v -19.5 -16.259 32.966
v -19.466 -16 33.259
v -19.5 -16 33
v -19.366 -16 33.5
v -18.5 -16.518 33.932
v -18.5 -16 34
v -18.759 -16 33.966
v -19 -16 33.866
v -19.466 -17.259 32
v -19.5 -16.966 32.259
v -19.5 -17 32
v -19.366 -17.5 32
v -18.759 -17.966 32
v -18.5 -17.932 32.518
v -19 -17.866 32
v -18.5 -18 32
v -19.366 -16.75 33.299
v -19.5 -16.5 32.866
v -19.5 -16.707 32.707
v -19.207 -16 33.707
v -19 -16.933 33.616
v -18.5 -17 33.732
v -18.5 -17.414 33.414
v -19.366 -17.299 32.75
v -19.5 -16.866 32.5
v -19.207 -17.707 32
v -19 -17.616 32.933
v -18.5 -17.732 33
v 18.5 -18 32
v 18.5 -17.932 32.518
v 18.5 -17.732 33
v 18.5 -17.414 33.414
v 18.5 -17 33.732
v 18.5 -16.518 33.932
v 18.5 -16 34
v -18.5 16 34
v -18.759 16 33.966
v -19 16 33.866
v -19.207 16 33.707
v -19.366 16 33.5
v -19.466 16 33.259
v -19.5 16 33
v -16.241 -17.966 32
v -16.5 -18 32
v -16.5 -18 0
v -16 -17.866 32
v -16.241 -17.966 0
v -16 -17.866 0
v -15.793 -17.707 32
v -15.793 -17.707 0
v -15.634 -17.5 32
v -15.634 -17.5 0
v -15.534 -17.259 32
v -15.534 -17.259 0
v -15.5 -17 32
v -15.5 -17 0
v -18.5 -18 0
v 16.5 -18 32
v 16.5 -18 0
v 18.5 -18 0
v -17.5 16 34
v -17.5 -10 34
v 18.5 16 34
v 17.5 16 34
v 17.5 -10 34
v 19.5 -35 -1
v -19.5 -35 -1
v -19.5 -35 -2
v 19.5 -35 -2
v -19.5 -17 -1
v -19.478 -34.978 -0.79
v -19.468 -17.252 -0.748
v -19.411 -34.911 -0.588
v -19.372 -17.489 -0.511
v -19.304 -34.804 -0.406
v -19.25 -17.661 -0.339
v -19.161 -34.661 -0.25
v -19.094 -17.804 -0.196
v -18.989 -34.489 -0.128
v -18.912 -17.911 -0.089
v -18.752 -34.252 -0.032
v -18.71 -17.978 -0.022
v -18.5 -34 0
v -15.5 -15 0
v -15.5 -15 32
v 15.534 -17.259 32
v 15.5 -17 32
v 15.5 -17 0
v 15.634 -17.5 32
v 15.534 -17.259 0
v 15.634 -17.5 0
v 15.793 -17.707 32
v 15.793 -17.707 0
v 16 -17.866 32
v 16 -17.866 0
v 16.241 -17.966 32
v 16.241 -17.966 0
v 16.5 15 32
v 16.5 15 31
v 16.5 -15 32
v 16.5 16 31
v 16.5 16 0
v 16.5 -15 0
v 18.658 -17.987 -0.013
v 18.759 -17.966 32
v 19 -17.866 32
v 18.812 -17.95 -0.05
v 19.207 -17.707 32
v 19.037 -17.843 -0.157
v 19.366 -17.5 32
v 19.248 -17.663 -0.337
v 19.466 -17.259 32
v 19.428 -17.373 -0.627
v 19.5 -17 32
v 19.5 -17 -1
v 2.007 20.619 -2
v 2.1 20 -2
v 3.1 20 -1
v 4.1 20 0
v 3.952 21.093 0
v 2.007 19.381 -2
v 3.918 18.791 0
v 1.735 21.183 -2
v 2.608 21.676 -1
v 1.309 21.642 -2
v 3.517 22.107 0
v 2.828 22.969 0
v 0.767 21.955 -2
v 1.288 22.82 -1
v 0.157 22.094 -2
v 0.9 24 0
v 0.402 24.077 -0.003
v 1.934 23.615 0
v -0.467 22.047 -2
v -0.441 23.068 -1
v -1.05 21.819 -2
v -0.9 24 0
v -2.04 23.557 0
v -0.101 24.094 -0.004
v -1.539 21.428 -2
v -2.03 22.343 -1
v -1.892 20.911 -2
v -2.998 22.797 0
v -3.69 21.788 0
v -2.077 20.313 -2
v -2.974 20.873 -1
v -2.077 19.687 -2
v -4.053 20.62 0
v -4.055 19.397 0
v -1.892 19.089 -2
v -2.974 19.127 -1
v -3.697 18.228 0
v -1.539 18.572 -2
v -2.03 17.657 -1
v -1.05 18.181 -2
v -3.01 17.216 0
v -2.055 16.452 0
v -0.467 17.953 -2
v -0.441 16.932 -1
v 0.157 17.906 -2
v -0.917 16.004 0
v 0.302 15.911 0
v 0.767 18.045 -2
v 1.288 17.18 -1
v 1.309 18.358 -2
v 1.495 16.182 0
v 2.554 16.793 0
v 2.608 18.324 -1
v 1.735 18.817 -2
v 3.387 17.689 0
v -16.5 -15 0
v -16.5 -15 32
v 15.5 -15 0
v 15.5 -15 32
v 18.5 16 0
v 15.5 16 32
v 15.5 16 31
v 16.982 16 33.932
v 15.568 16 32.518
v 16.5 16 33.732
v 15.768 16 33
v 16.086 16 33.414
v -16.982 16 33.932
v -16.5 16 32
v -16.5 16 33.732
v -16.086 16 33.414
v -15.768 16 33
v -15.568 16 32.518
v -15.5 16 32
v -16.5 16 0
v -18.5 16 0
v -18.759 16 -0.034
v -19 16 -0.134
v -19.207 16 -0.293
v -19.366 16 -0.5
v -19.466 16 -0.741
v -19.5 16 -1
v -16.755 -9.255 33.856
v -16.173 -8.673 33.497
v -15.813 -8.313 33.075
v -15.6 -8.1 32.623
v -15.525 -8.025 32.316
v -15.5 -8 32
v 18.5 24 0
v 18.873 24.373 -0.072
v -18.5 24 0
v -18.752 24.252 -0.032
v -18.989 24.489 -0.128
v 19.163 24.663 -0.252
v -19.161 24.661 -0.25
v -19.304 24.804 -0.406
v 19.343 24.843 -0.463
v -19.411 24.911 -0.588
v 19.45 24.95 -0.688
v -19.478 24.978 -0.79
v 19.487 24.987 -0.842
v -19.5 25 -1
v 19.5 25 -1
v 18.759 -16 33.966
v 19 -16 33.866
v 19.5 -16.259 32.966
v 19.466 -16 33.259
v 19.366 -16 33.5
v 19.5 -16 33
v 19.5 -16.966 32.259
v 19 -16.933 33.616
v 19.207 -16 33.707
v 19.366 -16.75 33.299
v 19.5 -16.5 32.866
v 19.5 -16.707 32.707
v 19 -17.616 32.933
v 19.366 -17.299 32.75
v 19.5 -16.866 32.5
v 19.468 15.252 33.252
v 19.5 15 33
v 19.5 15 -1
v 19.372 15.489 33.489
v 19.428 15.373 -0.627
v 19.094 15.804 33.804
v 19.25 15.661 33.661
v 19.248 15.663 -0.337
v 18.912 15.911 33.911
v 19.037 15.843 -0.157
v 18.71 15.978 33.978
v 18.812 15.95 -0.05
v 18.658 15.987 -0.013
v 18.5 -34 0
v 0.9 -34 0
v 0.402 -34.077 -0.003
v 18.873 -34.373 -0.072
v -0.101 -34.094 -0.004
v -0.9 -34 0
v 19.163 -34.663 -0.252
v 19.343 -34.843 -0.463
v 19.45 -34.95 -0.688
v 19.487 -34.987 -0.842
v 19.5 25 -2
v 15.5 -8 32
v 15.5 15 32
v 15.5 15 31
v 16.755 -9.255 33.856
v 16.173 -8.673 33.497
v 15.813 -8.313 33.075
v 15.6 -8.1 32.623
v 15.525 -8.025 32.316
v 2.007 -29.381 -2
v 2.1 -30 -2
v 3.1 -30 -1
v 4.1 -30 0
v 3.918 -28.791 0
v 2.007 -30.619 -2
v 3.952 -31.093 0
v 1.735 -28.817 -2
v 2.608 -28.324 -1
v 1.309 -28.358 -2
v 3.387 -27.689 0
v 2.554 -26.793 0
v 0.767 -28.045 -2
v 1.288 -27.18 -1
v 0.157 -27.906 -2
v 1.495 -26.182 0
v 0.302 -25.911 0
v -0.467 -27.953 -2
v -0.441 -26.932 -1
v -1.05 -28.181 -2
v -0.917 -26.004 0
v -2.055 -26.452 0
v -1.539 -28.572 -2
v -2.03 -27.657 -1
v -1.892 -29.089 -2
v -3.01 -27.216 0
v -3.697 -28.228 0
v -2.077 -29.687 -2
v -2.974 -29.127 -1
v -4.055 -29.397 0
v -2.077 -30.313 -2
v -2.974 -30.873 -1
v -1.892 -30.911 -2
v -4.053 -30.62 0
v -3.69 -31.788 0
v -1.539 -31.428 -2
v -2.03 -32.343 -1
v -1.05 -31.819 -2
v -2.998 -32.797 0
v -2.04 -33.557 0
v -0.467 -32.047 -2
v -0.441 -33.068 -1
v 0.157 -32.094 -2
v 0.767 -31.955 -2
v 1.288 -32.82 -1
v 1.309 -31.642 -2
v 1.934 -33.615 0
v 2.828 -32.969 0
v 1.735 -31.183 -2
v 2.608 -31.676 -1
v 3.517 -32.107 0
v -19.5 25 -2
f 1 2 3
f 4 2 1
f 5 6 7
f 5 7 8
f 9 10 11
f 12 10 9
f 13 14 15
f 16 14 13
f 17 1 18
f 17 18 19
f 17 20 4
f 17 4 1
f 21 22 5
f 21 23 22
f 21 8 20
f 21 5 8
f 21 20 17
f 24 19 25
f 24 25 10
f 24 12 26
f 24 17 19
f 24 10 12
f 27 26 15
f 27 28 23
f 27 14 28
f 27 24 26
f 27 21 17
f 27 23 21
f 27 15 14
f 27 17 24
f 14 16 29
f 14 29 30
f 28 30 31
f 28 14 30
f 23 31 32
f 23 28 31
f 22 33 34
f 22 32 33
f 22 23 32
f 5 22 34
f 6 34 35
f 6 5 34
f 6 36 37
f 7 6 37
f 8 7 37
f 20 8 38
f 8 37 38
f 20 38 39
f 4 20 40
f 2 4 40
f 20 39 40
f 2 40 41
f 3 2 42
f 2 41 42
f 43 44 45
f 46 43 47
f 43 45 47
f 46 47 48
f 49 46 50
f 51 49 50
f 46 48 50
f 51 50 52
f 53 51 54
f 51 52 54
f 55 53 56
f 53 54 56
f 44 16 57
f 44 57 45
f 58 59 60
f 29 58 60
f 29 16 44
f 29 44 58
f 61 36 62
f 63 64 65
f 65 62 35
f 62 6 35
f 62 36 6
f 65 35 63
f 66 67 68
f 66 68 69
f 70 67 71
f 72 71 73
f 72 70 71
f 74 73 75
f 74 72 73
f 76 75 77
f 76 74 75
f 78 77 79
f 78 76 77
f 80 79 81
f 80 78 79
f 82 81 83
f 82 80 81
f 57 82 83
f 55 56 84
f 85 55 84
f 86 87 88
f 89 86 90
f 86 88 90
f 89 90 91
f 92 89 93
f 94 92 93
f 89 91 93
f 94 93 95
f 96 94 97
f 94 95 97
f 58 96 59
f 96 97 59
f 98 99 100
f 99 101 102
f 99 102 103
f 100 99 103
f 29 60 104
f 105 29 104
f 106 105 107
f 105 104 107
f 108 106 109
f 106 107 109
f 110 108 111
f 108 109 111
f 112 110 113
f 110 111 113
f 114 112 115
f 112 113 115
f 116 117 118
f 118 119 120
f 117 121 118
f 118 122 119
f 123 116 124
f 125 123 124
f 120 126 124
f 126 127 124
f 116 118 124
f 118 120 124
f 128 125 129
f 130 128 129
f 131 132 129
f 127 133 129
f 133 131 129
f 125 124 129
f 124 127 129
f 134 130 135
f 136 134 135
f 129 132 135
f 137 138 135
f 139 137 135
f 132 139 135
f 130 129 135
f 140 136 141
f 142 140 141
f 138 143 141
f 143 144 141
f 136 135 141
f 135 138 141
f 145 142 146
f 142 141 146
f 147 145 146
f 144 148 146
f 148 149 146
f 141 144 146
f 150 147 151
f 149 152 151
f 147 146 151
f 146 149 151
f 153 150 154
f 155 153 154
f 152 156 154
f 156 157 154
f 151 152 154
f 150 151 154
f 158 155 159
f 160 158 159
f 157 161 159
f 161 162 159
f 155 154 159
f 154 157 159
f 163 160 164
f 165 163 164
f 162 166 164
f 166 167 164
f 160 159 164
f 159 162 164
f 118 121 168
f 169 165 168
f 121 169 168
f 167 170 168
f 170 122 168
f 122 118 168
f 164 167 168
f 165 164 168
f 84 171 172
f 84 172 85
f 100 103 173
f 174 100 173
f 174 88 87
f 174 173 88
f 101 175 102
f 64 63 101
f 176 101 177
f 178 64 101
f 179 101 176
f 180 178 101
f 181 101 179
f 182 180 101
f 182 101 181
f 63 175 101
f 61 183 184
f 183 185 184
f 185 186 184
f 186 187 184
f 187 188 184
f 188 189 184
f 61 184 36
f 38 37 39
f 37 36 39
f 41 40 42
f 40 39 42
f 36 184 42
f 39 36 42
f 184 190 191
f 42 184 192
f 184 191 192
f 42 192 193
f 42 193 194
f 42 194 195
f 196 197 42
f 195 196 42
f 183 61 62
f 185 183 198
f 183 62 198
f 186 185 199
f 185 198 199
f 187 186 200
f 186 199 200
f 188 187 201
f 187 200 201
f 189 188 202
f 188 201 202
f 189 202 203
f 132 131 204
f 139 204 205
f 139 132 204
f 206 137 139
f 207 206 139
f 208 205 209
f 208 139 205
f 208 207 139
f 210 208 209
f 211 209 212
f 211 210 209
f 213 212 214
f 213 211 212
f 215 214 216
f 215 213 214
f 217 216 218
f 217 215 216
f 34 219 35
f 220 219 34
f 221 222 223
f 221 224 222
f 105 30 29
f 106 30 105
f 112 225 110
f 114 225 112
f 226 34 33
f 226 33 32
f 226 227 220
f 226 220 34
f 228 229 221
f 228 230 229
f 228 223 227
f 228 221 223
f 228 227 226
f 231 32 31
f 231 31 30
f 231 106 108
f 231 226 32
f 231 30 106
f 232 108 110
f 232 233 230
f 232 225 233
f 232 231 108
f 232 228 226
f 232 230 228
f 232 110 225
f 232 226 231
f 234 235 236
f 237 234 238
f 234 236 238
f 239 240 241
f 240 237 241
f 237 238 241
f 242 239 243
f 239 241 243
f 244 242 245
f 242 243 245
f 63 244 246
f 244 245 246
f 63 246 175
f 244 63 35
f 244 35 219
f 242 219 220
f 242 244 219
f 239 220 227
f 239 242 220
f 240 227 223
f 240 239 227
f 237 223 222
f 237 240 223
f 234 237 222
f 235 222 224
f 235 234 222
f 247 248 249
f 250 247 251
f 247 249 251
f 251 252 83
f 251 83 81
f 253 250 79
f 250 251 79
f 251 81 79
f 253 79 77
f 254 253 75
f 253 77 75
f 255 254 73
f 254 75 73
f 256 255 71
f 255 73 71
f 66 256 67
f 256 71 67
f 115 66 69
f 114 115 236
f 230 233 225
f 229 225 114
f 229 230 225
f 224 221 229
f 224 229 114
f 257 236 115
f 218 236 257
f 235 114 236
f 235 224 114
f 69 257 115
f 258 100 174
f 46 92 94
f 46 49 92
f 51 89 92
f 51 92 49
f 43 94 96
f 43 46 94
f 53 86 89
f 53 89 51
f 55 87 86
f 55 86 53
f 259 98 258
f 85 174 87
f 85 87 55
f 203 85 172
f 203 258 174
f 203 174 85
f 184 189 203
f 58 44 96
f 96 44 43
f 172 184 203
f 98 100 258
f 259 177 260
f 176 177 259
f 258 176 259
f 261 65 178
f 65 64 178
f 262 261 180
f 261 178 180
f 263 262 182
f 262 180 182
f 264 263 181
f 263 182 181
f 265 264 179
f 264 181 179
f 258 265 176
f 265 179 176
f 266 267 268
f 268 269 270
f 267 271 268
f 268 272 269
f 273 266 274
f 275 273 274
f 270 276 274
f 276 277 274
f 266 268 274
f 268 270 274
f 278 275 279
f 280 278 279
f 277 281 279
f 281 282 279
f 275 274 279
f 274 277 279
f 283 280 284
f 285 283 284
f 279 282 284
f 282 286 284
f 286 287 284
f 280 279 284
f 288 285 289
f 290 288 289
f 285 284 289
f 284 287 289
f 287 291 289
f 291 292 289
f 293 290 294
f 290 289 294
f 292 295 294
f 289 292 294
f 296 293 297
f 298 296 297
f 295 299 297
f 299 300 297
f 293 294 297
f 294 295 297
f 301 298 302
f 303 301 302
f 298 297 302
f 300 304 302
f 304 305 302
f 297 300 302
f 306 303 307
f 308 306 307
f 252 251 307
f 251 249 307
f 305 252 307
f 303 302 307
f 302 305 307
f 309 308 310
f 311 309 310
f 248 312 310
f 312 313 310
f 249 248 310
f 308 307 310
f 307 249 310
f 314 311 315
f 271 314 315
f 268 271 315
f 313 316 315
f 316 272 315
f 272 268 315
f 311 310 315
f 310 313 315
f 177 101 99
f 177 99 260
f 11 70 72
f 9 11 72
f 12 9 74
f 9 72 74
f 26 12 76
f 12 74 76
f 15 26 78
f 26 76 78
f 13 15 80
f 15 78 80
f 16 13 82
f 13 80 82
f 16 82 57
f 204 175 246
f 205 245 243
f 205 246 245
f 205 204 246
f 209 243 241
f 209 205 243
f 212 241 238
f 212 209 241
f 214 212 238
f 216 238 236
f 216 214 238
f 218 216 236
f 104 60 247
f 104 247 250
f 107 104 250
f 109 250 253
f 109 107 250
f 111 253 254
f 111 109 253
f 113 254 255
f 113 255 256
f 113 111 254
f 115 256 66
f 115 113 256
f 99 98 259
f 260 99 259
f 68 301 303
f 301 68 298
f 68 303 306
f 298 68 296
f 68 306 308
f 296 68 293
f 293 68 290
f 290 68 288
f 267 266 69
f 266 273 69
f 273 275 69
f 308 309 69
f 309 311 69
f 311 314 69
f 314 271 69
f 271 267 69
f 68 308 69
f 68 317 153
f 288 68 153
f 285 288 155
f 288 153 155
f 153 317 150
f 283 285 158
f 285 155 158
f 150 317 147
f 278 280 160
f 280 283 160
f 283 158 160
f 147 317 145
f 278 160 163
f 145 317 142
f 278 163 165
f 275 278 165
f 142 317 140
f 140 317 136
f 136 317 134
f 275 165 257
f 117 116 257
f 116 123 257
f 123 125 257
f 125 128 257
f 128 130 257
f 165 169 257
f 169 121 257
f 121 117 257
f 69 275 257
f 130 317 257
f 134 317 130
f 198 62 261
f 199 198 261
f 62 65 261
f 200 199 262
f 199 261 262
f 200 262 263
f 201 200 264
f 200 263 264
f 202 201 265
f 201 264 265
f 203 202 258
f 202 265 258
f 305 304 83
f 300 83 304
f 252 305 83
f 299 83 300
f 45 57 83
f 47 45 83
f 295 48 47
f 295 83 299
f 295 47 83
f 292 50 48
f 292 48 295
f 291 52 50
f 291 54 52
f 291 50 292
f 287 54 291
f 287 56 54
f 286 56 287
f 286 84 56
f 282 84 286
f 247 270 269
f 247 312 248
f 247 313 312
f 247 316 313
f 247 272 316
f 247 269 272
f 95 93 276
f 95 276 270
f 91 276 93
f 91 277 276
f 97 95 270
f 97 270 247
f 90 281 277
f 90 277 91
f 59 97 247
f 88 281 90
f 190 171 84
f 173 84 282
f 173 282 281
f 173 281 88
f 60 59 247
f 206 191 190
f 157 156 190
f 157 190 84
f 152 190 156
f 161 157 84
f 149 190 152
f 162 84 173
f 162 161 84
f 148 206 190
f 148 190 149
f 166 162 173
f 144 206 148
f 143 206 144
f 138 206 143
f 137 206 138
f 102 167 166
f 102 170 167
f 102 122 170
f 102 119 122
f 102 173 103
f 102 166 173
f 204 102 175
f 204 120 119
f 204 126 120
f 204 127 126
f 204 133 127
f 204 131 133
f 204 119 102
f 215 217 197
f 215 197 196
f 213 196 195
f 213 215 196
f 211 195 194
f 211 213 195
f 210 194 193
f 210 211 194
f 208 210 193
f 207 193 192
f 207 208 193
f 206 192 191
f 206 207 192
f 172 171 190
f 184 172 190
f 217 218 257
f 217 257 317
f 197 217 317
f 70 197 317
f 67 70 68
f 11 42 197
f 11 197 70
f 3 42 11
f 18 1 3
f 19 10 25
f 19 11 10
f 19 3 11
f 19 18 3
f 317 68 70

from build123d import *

# Parameters (mm, degrees)
F0_W          = 3
F0_H          = 9
F0_H_2        = 7
F0_H_3        = 3
F0_R          = 2.1
F0_W_2        = 1
F1_DEPTH      = 2
F2_DEPTH      = 34
F3_W          = 4
F3_H          = 2
F4_DEPTH      = 34
F5_SIZE       = 1.99999
F7_W          = 1
F7_H          = 1
F8_DEPTH      = 1
F3_W_2        = 31
F9_DEPTH      = 10
F10_R         = 1.99999
F11_T1_DEPTH  = 32
F11_T3_DEPTH  = 34.50001
F11_T5_DEPTH  = 32.00001
F11_T7_DEPTH  = 19.5
F11_T9_DEPTH  = 11.5
F11_T11_DEPTH = 44
F11_T13_DEPTH = 36.5
F11_T16_ANGLE = 90
F11_T18_ANGLE = 90
F11_T23_DEPTH = 34.50001
F11_T27_DEPTH = 22
F11_T34_DEPTH = 14
F11_T38_DEPTH = 39
F11_T45_DEPTH = 22
F11_T49_DEPTH = 34.50001


# Not quite as in the source:
# - a fillet or chamfer that OpenCascade refuses, or shapes differently, is made with other operations: its cross-section is extruded or revolved along the edge and cut away or added
# - a fillet or chamfer is up to 0.001 mm smaller than in the source, because OpenCascade refuses the exact size
# - a feature of the source that left no trace in its solid (it failed there, or was rolled back) is left out
# - a feature names something its author has since deleted; it is built from what else it names


with BuildPart() as f1:
    # F0 (on Top) → F1 (new body)
    with BuildSketch(Plane.XY):
        with Locations((18, 20.5)):
            Rectangle(F0_W, F0_H)
        with Locations((-18, 20.5)):
            Rectangle(F0_W, F0_H)
        with Locations((18, -21.5)):
            Rectangle(F0_W, F0_H_2)
        with Locations((-18, -21.5)):
            Rectangle(F0_W, F0_H_2)
        with Locations((18, -16.5)):
            Rectangle(F0_W, F0_H_3)
        with Locations((-18, -16.5)):
            Rectangle(F0_W, F0_H_3)
        Polygon((19.5, -35), (19.5, -25), (16.5, -25), (-16.5, -25), (-19.5, -25), (-19.5, -35), align=None)
        with Locations((0, -30)):
            Circle(F0_R, mode=Mode.SUBTRACT)
        Polygon((19.5, -15), (19.5, 16), (16.5, 16), (16.5, 15), (16.5, -15), align=None)
        Polygon((-16.5, 15), (-16.5, 16), (-19.5, 16), (-19.5, 15), (-19.5, -15), (-16.5, -15), align=None)
        Polygon((16.5, 16), (16.5, 25), (-16.5, 25), (-16.5, 16), (-16.5, 15), (16.5, 15), align=None)
        with Locations((0, 20)):
            Circle(F0_R, mode=Mode.SUBTRACT)
        Polygon((16.5, -15), (16.5, 15), (-16.5, 15), (-16.5, -15), (-15.5, -15), (15.5, -15), align=None)
        with Locations((-16, -16.5)):
            Rectangle(F0_W_2, F0_H_3)
        with Locations((16, -16.5)):
            Rectangle(F0_W_2, F0_H_3)
        Polygon((16.5, -25), (16.5, -18), (15.5, -18), (15.5, -15), (-15.5, -15), (-15.5, -18), (-16.5, -18), (-16.5, -25), align=None)
        with Locations((0, -20)):
            Circle(F0_R, mode=Mode.SUBTRACT)
        with Locations((0, -20)):
            Circle(F0_R)
    extrude(amount=-F1_DEPTH)

    # F0 (on Top) → F2 (join)
    with BuildSketch(Plane.XY):
        Polygon((-16.5, 15), (-16.5, 16), (-19.5, 16), (-19.5, 15), (-19.5, -15), (-16.5, -15), align=None)
        with Locations((-18, -16.5)):
            Rectangle(F0_W, F0_H_3)
        with Locations((18, -16.5)):
            Rectangle(F0_W, F0_H_3)
        with Locations((16, -16.5)):
            Rectangle(F0_W_2, F0_H_3)
        with Locations((-16, -16.5)):
            Rectangle(F0_W_2, F0_H_3)
        Polygon((19.5, -15), (19.5, 16), (16.5, 16), (16.5, 15), (16.5, -15), align=None)
    extrude(amount=F2_DEPTH)

    # F3 (on face) → F4 (join)
    with BuildSketch(Plane.XZ.offset(18)):
        with Locations((-17.5, 33)):
            Rectangle(F3_W, F3_H)
        with Locations((17.5, 33)):
            Rectangle(F3_W, F3_H)
    extrude(amount=-F4_DEPTH)

    # F5 (size 2 in the source; OpenCascade refuses exactly that, so slightly less here)
    f5_edges = [f1.edges().sort_by_distance(p)[0] for p in [
        (-2.1, -30, 0),
        (-2.1, 20, 0),
    ]]
    chamfer(f5_edges, length=F5_SIZE)

    # F7 (on face) → F8 (join)
    with BuildSketch(Plane(origin=(0, 16, 0), x_dir=(-1, 0, 0), z_dir=(0, 1, 0))):
        with Locations((-16, 31.5)):
            Rectangle(F7_W, F7_H)
        Polygon((15.9987417102, 33.0025165796), (15.5, 34), (15.5050715785, 33.0000128605), align=None)
    extrude(amount=-F8_DEPTH)

    # F3 (on face) → F9 (join)
    with BuildSketch(Plane.XZ.offset(18)):
        with Locations((0, 33)):
            Rectangle(F3_W_2, F3_H)
    extrude(amount=-F9_DEPTH)

    # F10 (radius 2 in the source; OpenCascade refuses exactly that, so slightly less here)
    f10_edges = [f1.edges().sort_by_distance(p)[0] for p in [
        (0, -18, 34),
        (-15.5, 4, 34),
        (0, -8, 34),
        (15.5, 4, 34),
    ]]
    fillet(f10_edges, radius=F10_R)

    # F11: fillet of radius 1 on 15 edges, made by hand

    # F11_s2 → F11_t1 (cut)
    with BuildSketch(Plane.XY):
        with BuildLine():
            ThreePointArc((-16.5, -18), (-15.7928932188, -17.7071067812), (-15.5, -17))
            Line((-15.5, -17), (-15.5, -18))
            Line((-15.5, -18), (-16.5, -18))
        make_face()
        with BuildLine():
            ThreePointArc((15.5, -17), (15.7928932188, -17.7071067812), (16.5, -18))
            Line((16.5, -18), (15.5, -18))
            Line((15.5, -18), (15.5, -17))
        make_face()
    extrude(amount=F11_T1_DEPTH, mode=Mode.SUBTRACT)

    # F11_s4 → F11_t3 (cut)
    with BuildSketch(Plane.XZ.offset(-18.5)):
        with BuildLine():
            ThreePointArc((-18.5, 34), (-19.2071067812, 33.7071067812), (-19.5, 33))
            Line((-19.5, 33), (-19.5, 34))
            Line((-19.5, 34), (-18.5, 34))
        make_face()
        with BuildLine():
            ThreePointArc((18.5, 34), (19.2071067812, 33.7071067812), (19.5, 33))
            Line((19.5, 33), (19.5, 34))
            Line((19.5, 34), (18.5, 34))
        make_face()
    extrude(amount=F11_T3_DEPTH, mode=Mode.SUBTRACT)

    # F11_s6 → F11_t5 (cut)
    with BuildSketch(Plane.XY):
        with BuildLine():
            ThreePointArc((-19.5, -17), (-19.2071067812, -17.7071067812), (-18.5, -18))
            Line((-18.5, -18), (-19.5, -18))
            Line((-19.5, -18), (-19.5, -17))
        make_face()
        with BuildLine():
            ThreePointArc((18.5, -18), (19.2071067812, -17.7071067812), (19.5, -17))
            Line((19.5, -17), (19.5, -18))
            Line((19.5, -18), (18.5, -18))
        make_face()
    extrude(amount=F11_T5_DEPTH, mode=Mode.SUBTRACT)

    # F11_s8 → F11_t7 (cut)
    with BuildSketch(Plane.XZ.offset(18)):
        with BuildLine():
            ThreePointArc((-19.5, -1), (-19.2071067812, -0.2928932188), (-18.5, 0))
            Line((-18.5, 0), (-19.5, 0))
            Line((-19.5, 0), (-19.5, -1))
        make_face()
        with BuildLine():
            ThreePointArc((18.5, 0), (19.2071067812, -0.2928932188), (19.5, -1))
            Line((19.5, -1), (19.5, 0))
            Line((19.5, 0), (18.5, 0))
        make_face()
    extrude(amount=F11_T7_DEPTH, mode=Mode.SUBTRACT)

    # F11_s10 → F11_t9 (cut)
    with BuildSketch(Plane.XZ.offset(-27.5)):
        with BuildLine():
            ThreePointArc((-19.5, -1), (-19.2071067812, -0.2928932188), (-18.5, 0))
            Line((-18.5, 0), (-19.5, 0))
            Line((-19.5, 0), (-19.5, -1))
        make_face()
        with BuildLine():
            ThreePointArc((18.5, 0), (19.2071067812, -0.2928932188), (19.5, -1))
            Line((19.5, -1), (19.5, 0))
            Line((19.5, 0), (18.5, 0))
        make_face()
    extrude(amount=F11_T9_DEPTH, mode=Mode.SUBTRACT)

    # F11_s12 → F11_t11 (cut)
    with BuildSketch(Plane.YZ.offset(-22)):
        with BuildLine():
            ThreePointArc((-34, 0), (-34.7071067812, -0.2928932188), (-35, -1))
            Line((-35, -1), (-35, 0))
            Line((-35, 0), (-34, 0))
        make_face()
        with BuildLine():
            ThreePointArc((24, 0), (24.7071067812, -0.2928932188), (25, -1))
            Line((25, -1), (25, 0))
            Line((25, 0), (24, 0))
        make_face()
    extrude(amount=F11_T11_DEPTH, mode=Mode.SUBTRACT)

    # F11_s14 → F11_t13 (cut)
    with BuildSketch(Plane.XY):
        with BuildLine():
            ThreePointArc((19.5, 15), (19.2071067812, 15.7071067812), (18.5, 16))
            Line((18.5, 16), (19.5, 16))
            Line((19.5, 16), (19.5, 15))
        make_face()
    extrude(amount=F11_T13_DEPTH, mode=Mode.SUBTRACT)

    # F11_s15 → F11_t16 (revolve, cut)
    with BuildSketch(Plane.XZ.offset(16.00001)):
        with BuildLine():
            ThreePointArc((-19.5, 33), (-19.2071067812, 33.7071067812), (-18.5, 34))
            Line((-18.5, 34), (-19.5, 34))
            Line((-19.5, 34), (-19.5, 33))
        make_face()
    revolve(axis=Axis((-19.5, -16.00001, 32.00001), (1, 0, 0)), revolution_arc=F11_T16_ANGLE, mode=Mode.SUBTRACT)

    # F11_s17 → F11_t18 (revolve, cut)
    with BuildSketch(Plane.XZ.offset(16.00001)):
        with BuildLine():
            ThreePointArc((18.5, 34), (19.2071067812, 33.7071067812), (19.5, 33))
            Line((19.5, 33), (19.5, 34))
            Line((19.5, 34), (18.5, 34))
        make_face()
    revolve(axis=Axis((19.5, -16.00001, 32.00001), (1, 0, 0)), revolution_arc=F11_T18_ANGLE, mode=Mode.SUBTRACT)


with BuildPart() as f11_tool21:
    # F11_s22 → F11_t23 (new body)
    with BuildSketch(Plane.XY.offset(-2.5)):
        with BuildLine():
            ThreePointArc((-19.5, -17), (-19.2071067812, -17.7071067812), (-18.5, -18))
            Line((-18.5, -18), (-19.5, -18))
            Line((-19.5, -18), (-19.5, -17))
        make_face()
    extrude(amount=F11_T23_DEPTH)

    split(bisect_by=Plane.XY, keep=Keep.BOTTOM)


with BuildPart() as f11_tool25:
    # F11_s26 → F11_t27 (new body)
    with BuildSketch(Plane.XZ.offset(15.5)):
        with BuildLine():
            ThreePointArc((-19.5, -1), (-19.2071067812, -0.2928932188), (-18.5, 0))
            Line((-18.5, 0), (-19.5, 0))
            Line((-19.5, 0), (-19.5, -1))
        make_face()
    extrude(amount=F11_T27_DEPTH)

    split(bisect_by=Plane.XZ.offset(18), keep=Keep.BOTTOM)


with BuildPart() as f11_tool21_1:
    add(f11_tool21.part)

    # F11_t29: intersect F11_tool25
    add(f11_tool25.part, mode=Mode.INTERSECT)


with BuildPart() as f1_1:
    add(f1.part)

    # F11_t19: cut F11_tool21
    add(f11_tool21_1.part, mode=Mode.SUBTRACT)


with BuildPart() as f11_tool32:
    # F11_s33 → F11_t34 (new body)
    with BuildSketch(Plane.XZ.offset(-13.5)):
        with BuildLine():
            ThreePointArc((18.5, 0), (19.2071067812, -0.2928932188), (19.5, -1))
            Line((19.5, -1), (19.5, 0))
            Line((19.5, 0), (18.5, 0))
        make_face()
    extrude(amount=-F11_T34_DEPTH)

    split(bisect_by=Plane.XZ.offset(-16), keep=Keep.TOP)


with BuildPart() as f11_tool36:
    # F11_s37 → F11_t38 (new body)
    with BuildSketch(Plane.XY.offset(-2.5)):
        with BuildLine():
            ThreePointArc((19.5, 15), (19.2071067812, 15.7071067812), (18.5, 16))
            Line((18.5, 16), (19.5, 16))
            Line((19.5, 16), (19.5, 15))
        make_face()
    extrude(amount=F11_T38_DEPTH)

    split(bisect_by=Plane.XY, keep=Keep.BOTTOM)


with BuildPart() as f11_tool32_1:
    add(f11_tool32.part)

    # F11_t40: intersect F11_tool36
    add(f11_tool36.part, mode=Mode.INTERSECT)


with BuildPart() as f1_2:
    add(f1_1.part)

    # F11_t30: cut F11_tool32
    add(f11_tool32_1.part, mode=Mode.SUBTRACT)


with BuildPart() as f11_tool43:
    # F11_s44 → F11_t45 (new body)
    with BuildSketch(Plane.XZ.offset(37.5)):
        with BuildLine():
            ThreePointArc((18.5, 0), (19.2071067812, -0.2928932188), (19.5, -1))
            Line((19.5, -1), (19.5, 0))
            Line((19.5, 0), (18.5, 0))
        make_face()
    extrude(amount=-F11_T45_DEPTH)

    split(bisect_by=Plane.XZ.offset(18), keep=Keep.BOTTOM)


with BuildPart() as f11_tool47:
    # F11_s48 → F11_t49 (new body)
    with BuildSketch(Plane.XY.offset(32.00001)):
        with BuildLine():
            ThreePointArc((18.5, -18), (19.2071067812, -17.7071067812), (19.5, -17))
            Line((19.5, -17), (19.5, -18))
            Line((19.5, -18), (18.5, -18))
        make_face()
    extrude(amount=-F11_T49_DEPTH)

    split(bisect_by=Plane.XY, keep=Keep.BOTTOM)


with BuildPart() as f11_tool43_1:
    add(f11_tool43.part)

    # F11_t51: intersect F11_tool47
    add(f11_tool47.part, mode=Mode.INTERSECT)


with BuildPart() as f1_3:
    add(f1_2.part)

    # F11_t41: cut F11_tool43
    add(f11_tool43_1.part, mode=Mode.SUBTRACT)


solid = f1_3.part
